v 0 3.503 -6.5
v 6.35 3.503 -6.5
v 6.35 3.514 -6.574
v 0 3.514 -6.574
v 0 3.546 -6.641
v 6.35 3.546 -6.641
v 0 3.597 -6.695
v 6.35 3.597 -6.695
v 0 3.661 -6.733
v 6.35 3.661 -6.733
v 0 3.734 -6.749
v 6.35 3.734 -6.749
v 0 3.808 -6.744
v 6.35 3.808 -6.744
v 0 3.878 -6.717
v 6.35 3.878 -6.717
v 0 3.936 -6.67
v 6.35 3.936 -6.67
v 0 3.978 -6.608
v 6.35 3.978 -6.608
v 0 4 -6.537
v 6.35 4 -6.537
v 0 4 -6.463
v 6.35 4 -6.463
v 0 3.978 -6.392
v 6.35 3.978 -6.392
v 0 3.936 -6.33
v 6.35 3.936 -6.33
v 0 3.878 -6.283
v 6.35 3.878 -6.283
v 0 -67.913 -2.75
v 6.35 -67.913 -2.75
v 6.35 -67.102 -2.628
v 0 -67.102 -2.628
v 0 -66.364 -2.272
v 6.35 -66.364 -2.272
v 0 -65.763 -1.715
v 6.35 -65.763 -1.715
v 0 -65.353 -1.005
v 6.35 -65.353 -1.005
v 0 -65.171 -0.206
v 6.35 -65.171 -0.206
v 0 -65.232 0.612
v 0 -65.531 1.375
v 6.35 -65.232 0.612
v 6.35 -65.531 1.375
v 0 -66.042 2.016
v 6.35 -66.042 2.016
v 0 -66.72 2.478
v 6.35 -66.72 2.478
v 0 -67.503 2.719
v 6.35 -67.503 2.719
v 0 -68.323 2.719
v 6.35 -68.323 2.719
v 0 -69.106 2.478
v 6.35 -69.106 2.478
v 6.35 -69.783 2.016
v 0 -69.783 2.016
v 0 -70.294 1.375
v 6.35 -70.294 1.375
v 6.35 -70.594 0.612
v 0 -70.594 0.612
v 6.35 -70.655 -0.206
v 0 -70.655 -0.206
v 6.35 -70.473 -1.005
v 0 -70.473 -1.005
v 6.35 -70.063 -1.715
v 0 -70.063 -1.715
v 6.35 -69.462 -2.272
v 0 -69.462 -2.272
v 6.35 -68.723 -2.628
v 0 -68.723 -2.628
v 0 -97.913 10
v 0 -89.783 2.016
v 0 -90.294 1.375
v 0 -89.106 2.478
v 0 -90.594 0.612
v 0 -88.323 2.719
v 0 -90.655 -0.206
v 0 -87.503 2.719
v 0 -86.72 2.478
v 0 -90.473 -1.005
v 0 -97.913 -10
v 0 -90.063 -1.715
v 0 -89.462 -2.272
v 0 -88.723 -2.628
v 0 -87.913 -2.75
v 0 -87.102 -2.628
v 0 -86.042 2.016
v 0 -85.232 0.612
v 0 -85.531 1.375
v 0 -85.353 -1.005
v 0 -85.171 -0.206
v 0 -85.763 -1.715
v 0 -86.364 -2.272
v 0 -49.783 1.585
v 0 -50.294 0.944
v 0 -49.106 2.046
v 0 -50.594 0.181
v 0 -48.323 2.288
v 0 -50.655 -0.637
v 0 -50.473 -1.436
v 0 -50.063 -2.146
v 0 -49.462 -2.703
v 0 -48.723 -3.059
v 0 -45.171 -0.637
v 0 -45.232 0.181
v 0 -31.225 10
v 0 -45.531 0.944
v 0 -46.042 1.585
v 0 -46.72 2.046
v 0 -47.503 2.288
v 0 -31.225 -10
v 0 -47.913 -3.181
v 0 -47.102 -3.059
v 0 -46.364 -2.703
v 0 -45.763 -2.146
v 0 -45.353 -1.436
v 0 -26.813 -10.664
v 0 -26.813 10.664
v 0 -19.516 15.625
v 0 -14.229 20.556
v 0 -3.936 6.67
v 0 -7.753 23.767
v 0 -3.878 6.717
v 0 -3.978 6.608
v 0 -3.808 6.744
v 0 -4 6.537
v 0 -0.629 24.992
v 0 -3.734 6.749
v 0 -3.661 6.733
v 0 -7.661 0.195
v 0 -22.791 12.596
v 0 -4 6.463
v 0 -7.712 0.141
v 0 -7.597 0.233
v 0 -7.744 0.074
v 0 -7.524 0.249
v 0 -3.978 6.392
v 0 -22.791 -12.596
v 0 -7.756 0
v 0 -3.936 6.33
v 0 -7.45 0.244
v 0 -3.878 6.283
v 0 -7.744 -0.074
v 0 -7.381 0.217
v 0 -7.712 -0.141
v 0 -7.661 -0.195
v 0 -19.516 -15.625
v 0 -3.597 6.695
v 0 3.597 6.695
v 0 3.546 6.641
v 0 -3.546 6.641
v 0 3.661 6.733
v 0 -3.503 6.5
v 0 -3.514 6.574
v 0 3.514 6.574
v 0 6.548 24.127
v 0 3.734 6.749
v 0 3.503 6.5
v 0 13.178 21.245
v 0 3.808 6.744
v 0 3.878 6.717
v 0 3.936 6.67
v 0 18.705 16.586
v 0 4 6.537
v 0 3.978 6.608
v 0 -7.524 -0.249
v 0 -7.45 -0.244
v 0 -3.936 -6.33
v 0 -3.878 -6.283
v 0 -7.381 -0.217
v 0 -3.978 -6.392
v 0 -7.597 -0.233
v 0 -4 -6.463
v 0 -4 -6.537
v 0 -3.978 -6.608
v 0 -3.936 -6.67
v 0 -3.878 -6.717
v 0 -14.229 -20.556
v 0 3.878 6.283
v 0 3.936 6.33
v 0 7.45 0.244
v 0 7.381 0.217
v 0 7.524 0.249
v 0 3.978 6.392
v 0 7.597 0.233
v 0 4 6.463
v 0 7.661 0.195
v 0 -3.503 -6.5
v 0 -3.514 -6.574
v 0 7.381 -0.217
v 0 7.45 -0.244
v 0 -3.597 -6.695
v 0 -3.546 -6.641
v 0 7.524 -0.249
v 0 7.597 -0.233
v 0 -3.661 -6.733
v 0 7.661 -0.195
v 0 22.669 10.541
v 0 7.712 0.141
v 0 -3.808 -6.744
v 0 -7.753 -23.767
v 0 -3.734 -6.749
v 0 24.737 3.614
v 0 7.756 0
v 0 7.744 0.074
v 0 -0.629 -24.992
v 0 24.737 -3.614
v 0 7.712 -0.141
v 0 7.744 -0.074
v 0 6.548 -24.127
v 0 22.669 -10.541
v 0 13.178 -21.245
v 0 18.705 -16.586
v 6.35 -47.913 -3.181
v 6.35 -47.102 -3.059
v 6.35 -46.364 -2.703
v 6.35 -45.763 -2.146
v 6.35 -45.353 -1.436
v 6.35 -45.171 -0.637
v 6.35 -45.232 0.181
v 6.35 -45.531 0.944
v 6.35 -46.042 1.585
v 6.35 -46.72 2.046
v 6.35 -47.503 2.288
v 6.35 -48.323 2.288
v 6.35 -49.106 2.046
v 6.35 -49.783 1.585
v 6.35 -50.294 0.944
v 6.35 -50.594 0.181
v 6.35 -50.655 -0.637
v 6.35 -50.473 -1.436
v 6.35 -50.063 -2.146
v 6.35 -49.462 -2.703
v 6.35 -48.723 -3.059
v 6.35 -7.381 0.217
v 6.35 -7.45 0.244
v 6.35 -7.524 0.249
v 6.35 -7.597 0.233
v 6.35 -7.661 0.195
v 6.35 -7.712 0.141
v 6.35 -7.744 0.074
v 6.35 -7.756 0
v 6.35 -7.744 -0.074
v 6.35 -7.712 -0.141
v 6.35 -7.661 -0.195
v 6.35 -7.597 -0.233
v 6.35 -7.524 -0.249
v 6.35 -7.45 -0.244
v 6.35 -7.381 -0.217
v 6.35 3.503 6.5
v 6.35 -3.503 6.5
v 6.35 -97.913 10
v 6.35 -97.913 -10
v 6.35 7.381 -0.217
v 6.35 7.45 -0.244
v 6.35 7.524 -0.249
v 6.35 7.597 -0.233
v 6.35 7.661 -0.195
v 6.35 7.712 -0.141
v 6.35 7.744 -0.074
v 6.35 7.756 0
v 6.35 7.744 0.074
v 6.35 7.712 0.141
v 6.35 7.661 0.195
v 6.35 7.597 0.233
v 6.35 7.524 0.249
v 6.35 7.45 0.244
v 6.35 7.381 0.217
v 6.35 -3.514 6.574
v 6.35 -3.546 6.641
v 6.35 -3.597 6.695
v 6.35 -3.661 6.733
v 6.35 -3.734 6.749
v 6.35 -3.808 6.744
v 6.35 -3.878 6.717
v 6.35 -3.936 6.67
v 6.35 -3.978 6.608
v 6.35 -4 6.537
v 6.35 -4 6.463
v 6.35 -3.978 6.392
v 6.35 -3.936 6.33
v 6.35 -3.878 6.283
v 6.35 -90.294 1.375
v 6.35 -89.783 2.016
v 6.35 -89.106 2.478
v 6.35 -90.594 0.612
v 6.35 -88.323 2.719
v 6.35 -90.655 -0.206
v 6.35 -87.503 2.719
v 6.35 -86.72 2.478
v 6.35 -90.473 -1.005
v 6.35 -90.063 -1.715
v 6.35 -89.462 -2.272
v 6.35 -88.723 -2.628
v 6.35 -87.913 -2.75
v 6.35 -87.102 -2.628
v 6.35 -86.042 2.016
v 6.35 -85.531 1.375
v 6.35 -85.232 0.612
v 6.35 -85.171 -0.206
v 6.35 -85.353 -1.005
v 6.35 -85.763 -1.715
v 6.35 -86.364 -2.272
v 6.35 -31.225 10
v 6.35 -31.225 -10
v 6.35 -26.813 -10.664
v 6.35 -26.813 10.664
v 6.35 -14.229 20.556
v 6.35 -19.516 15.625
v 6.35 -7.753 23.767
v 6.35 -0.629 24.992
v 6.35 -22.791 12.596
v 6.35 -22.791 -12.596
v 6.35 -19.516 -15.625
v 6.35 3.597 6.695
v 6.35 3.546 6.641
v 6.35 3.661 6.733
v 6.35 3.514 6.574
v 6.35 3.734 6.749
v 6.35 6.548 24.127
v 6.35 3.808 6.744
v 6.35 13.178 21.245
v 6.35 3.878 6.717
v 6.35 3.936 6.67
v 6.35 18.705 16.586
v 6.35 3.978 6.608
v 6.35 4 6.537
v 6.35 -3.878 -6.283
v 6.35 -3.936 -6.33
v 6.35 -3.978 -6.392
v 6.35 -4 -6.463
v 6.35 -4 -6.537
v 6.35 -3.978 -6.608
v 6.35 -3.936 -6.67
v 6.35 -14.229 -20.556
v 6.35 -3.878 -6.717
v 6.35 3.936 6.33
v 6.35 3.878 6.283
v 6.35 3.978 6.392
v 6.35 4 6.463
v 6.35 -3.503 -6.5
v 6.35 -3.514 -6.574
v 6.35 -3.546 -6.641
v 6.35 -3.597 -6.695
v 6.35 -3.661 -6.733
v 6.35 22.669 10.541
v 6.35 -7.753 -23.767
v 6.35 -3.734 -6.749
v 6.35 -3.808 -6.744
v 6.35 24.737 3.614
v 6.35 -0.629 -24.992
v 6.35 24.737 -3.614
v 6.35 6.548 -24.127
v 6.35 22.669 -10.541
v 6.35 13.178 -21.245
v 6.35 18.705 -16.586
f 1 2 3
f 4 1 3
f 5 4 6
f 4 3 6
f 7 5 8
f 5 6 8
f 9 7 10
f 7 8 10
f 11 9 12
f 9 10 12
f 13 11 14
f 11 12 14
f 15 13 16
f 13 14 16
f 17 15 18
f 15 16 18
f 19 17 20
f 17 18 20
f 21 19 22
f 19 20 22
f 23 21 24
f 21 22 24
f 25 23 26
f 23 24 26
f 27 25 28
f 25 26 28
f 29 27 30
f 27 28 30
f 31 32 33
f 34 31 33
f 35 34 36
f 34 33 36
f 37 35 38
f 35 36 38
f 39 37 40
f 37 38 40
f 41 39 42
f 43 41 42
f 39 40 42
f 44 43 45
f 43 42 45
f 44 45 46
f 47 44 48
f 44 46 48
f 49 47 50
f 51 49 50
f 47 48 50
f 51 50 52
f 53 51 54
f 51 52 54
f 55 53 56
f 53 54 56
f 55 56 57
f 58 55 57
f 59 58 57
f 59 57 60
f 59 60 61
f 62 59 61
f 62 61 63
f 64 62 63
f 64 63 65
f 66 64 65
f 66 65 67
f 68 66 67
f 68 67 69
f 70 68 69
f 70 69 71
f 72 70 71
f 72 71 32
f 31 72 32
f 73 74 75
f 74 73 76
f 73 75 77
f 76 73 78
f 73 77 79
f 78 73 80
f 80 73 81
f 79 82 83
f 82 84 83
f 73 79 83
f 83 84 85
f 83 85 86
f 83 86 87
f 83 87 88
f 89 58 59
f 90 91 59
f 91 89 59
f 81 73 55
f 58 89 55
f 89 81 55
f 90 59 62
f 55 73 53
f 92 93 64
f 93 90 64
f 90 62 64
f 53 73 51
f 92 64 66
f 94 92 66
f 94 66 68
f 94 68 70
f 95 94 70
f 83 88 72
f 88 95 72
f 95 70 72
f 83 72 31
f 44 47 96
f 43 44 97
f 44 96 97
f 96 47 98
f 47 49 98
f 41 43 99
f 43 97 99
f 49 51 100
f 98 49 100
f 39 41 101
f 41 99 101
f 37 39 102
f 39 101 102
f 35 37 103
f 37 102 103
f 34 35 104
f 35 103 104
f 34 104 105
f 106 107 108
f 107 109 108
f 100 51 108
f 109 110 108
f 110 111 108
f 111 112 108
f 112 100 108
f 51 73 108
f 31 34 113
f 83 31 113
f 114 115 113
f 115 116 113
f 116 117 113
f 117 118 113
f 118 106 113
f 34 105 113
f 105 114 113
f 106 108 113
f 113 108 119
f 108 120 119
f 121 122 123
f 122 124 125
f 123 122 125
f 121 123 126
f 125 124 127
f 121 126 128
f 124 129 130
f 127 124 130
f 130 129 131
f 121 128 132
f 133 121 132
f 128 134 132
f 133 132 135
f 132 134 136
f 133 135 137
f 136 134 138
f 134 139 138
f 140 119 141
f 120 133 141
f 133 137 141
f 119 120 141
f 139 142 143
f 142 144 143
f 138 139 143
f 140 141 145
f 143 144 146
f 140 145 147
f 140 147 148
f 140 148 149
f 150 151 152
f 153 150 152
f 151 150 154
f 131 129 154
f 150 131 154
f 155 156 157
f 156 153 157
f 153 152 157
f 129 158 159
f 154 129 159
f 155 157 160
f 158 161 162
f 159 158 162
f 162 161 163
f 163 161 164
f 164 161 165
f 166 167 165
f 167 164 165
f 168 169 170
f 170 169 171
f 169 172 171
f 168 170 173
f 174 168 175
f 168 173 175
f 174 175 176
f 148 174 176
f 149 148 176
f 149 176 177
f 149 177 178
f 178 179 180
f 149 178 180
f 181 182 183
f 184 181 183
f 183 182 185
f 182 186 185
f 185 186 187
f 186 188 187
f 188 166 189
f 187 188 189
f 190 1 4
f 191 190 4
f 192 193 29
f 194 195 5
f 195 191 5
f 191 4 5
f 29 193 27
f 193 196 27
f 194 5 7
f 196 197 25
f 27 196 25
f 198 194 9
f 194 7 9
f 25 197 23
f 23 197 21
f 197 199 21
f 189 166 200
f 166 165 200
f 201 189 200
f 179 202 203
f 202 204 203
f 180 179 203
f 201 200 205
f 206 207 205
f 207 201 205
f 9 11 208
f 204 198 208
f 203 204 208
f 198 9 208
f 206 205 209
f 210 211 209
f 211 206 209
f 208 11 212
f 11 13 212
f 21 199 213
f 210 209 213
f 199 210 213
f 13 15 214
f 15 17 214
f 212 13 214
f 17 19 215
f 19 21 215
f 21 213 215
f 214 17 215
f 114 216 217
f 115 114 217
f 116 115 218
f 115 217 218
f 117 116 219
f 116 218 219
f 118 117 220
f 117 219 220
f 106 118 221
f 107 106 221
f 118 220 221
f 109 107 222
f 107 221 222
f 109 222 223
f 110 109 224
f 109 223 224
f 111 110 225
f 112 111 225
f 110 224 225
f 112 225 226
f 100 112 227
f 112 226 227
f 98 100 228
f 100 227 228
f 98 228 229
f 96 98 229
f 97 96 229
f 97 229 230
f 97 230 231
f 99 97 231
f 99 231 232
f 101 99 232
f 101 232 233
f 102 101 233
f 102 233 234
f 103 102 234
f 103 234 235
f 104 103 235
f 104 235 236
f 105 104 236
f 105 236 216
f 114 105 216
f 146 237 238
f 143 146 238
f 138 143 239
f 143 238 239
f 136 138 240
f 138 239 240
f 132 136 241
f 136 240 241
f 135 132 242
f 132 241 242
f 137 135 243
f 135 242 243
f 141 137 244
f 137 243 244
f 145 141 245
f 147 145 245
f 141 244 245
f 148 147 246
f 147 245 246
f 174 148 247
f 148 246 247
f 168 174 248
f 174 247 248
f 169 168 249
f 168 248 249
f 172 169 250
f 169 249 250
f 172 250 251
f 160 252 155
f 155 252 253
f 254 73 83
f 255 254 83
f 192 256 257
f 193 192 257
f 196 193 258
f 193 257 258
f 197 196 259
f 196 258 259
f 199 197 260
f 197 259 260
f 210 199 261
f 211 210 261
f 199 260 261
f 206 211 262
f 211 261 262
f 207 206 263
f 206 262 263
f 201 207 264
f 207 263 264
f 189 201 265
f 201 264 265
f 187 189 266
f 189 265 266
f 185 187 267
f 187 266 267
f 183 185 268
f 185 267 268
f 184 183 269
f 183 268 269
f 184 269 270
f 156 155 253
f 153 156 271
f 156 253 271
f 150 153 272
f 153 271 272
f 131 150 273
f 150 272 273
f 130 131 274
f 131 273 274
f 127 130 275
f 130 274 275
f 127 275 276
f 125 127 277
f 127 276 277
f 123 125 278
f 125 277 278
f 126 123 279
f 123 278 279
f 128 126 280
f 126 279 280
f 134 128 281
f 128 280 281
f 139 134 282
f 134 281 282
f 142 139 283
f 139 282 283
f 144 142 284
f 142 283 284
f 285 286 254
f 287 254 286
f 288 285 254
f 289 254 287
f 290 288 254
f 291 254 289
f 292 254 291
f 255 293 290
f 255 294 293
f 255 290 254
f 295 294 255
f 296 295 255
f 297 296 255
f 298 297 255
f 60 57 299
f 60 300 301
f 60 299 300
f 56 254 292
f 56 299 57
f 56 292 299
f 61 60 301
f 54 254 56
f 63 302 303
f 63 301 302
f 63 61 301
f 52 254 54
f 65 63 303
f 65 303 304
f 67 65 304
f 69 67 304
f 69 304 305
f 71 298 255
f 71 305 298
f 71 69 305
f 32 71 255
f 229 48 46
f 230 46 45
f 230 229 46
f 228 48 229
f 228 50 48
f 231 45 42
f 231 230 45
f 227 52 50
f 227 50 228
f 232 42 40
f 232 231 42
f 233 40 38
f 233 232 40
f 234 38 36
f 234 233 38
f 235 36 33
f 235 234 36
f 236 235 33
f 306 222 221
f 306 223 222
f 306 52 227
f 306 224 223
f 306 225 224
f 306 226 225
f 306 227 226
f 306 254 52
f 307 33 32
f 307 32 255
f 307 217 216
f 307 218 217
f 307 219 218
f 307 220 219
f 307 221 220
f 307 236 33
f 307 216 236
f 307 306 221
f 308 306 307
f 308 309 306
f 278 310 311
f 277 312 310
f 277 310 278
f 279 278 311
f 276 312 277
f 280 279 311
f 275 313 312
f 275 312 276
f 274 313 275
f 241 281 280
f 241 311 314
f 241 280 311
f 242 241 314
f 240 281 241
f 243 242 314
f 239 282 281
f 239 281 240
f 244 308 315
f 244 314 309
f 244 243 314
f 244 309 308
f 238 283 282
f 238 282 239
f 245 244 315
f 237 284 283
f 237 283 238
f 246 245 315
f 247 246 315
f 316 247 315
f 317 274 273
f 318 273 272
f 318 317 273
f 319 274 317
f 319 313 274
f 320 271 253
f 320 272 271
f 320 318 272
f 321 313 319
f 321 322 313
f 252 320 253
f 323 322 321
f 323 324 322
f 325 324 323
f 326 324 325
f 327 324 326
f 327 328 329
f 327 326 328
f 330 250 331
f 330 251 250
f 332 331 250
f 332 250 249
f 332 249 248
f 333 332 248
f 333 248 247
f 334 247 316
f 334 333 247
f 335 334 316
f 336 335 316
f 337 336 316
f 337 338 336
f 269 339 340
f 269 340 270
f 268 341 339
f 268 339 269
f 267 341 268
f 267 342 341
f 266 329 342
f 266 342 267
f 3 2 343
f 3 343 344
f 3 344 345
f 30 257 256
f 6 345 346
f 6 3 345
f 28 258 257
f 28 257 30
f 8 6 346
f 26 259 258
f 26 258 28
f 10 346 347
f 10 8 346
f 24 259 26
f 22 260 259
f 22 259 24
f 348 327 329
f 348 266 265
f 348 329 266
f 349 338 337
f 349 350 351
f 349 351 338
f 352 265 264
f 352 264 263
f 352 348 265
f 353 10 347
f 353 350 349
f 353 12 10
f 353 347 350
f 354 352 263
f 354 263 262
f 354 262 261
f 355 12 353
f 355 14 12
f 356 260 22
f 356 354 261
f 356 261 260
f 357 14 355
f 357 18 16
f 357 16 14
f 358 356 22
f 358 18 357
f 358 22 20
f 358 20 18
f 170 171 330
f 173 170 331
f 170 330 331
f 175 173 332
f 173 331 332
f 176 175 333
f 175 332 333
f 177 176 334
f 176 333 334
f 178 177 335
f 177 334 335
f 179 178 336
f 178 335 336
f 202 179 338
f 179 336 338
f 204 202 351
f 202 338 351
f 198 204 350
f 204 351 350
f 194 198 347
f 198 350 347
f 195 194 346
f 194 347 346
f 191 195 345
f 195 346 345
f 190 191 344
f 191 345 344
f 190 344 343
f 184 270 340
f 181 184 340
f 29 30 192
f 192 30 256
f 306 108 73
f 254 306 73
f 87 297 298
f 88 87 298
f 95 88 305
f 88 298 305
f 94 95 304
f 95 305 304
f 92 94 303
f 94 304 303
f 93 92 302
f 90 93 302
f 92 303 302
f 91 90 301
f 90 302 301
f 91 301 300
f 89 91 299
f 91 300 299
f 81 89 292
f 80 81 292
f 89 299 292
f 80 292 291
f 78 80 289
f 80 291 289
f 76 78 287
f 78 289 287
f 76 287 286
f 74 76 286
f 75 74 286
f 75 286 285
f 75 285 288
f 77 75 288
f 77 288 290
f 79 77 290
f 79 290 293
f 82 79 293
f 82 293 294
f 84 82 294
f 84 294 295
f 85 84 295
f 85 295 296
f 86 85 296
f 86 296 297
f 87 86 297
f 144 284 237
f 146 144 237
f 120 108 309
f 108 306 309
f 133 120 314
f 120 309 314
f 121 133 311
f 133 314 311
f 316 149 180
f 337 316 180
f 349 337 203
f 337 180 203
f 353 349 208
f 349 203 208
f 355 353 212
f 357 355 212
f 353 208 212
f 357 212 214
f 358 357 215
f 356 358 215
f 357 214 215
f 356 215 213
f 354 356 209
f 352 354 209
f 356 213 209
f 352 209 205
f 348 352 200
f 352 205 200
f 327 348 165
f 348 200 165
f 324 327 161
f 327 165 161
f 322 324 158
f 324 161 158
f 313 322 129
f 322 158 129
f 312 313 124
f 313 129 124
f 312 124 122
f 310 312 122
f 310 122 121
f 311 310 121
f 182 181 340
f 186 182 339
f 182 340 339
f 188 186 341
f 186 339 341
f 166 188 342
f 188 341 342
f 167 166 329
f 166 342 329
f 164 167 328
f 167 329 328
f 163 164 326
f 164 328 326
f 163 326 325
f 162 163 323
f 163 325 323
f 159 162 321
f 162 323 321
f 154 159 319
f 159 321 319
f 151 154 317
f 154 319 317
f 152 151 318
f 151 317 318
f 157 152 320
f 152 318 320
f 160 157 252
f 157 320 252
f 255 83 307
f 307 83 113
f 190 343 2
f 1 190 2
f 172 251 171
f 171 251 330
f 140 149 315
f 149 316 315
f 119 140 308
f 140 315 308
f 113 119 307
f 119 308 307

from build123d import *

# Parameters (mm, degrees)
BOSS_EXTRUDE1_DEPTH = 6.35
SKETCH2_R           = 2.75
CUT_EXTRUDE1_DEPTH  = 7.35
FILLET1_R           = 15
CUT_EXTRUDE2_REACH  = 8.35
CUT_EXTRUDE3_REACH  = 8.35
SKETCH4_R           = 0.25


with BuildPart() as part:
    # Sketch1 → Boss-Extrude1 (new body)
    with BuildSketch(Plane(origin=(0, 0, 0), x_dir=(0, 0, -1), z_dir=(1, 0, 0))):
        with BuildLine():
            Line((-10, -22.912878475), (-10, -97.912878475))
            Line((-10, -97.912878475), (10, -97.912878475))
            Line((10, -97.912878475), (10, -22.912878475))
            ThreePointArc((10, -22.912878475), (0, 25), (-10, -22.912878475))
        make_face()
    extrude(amount=BOSS_EXTRUDE1_DEPTH)

    # Sketch2 → Cut-Extrude1 (cut, through all)
    with BuildSketch(Plane(origin=(6.35, 0, 0), x_dir=(0, 0, -1), z_dir=(1, 0, 0))):
        with Locations((0, -87.912878475)):
            Circle(SKETCH2_R)
        with Locations((0, -67.912878475)):
            Circle(SKETCH2_R)
        with Locations((0.431184648, -47.912878475)):
            Circle(SKETCH2_R)
    extrude(amount=-CUT_EXTRUDE1_DEPTH, mode=Mode.SUBTRACT)

    # Fillet1
    fillet1_edges = [part.edges().sort_by_distance(p)[0] for p in [
        (3.175, -22.912878475, 10),
        (3.175, -22.912878475, -10),
    ]]
    fillet(fillet1_edges, radius=FILLET1_R)

    # Sketch3 → Cut-Extrude2 (cut, up to next)
    with BuildSketch(Plane(origin=(6.35, 0, 0), x_dir=(0, 0, -1), z_dir=(1, 0, 0)), mode=Mode.PRIVATE) as cut_extrude2_sk1:
        Polygon((0, -7.505553499), (6.5, -3.75277675), (6.5, 3.75277675), (0, 7.505553499), (-6.5, 3.75277675), (-6.5, -3.75277675), align=None)
    cut_extrude2_tool1 = extrude(cut_extrude2_sk1.sketch, amount=-CUT_EXTRUDE2_REACH, mode=Mode.PRIVATE) & part.part
    add(cut_extrude2_tool1.solids().sort_by_distance((6.35, 0, 0))[0], mode=Mode.SUBTRACT)

    # Sketch4 → Cut-Extrude3 (cut, up to next)
    with BuildSketch(Plane(origin=(6.35, 0, 0), x_dir=(0, 0, -1), z_dir=(1, 0, 0)), mode=Mode.PRIVATE) as cut_extrude3_sk1:
        with Locations((0, 7.505553499)):
            Circle(SKETCH4_R)
    cut_extrude3_tool1 = extrude(cut_extrude3_sk1.sketch, amount=-CUT_EXTRUDE3_REACH, mode=Mode.PRIVATE) & part.part
    add(cut_extrude3_tool1.solids().sort_by_distance((6.35, 7.505553, 0))[0], mode=Mode.SUBTRACT)
    # Sketch4 → Cut-Extrude3 (cut, up to next)
    with BuildSketch(Plane(origin=(6.35, 0, 0), x_dir=(0, 0, -1), z_dir=(1, 0, 0)), mode=Mode.PRIVATE) as cut_extrude3_sk2:
        with Locations((6.5, 3.75277675)):
            Circle(SKETCH4_R)
    cut_extrude3_tool2 = extrude(cut_extrude3_sk2.sketch, amount=-CUT_EXTRUDE3_REACH, mode=Mode.PRIVATE) & part.part
    add(cut_extrude3_tool2.solids().sort_by_distance((6.35, 3.752777, -6.5))[0], mode=Mode.SUBTRACT)
    # Sketch4 → Cut-Extrude3 (cut, up to next)
    with BuildSketch(Plane(origin=(6.35, 0, 0), x_dir=(0, 0, -1), z_dir=(1, 0, 0)), mode=Mode.PRIVATE) as cut_extrude3_sk3:
        with Locations((6.5, -3.75277675)):
            Circle(SKETCH4_R)
    cut_extrude3_tool3 = extrude(cut_extrude3_sk3.sketch, amount=-CUT_EXTRUDE3_REACH, mode=Mode.PRIVATE) & part.part
    add(cut_extrude3_tool3.solids().sort_by_distance((6.35, -3.752777, -6.5))[0], mode=Mode.SUBTRACT)
    # Sketch4 → Cut-Extrude3 (cut, up to next)
    with BuildSketch(Plane(origin=(6.35, 0, 0), x_dir=(0, 0, -1), z_dir=(1, 0, 0)), mode=Mode.PRIVATE) as cut_extrude3_sk4:
        with Locations((0, -7.505553499)):
            Circle(SKETCH4_R)
    cut_extrude3_tool4 = extrude(cut_extrude3_sk4.sketch, amount=-CUT_EXTRUDE3_REACH, mode=Mode.PRIVATE) & part.part
    add(cut_extrude3_tool4.solids().sort_by_distance((6.35, -7.505553, 0))[0], mode=Mode.SUBTRACT)
    # Sketch4 → Cut-Extrude3 (cut, up to next)
    with BuildSketch(Plane(origin=(6.35, 0, 0), x_dir=(0, 0, -1), z_dir=(1, 0, 0)), mode=Mode.PRIVATE) as cut_extrude3_sk5:
        with Locations((-6.5, -3.75277675)):
            Circle(SKETCH4_R)
    cut_extrude3_tool5 = extrude(cut_extrude3_sk5.sketch, amount=-CUT_EXTRUDE3_REACH, mode=Mode.PRIVATE) & part.part
    add(cut_extrude3_tool5.solids().sort_by_distance((6.35, -3.752777, 6.5))[0], mode=Mode.SUBTRACT)
    # Sketch4 → Cut-Extrude3 (cut, up to next)
    with BuildSketch(Plane(origin=(6.35, 0, 0), x_dir=(0, 0, -1), z_dir=(1, 0, 0)), mode=Mode.PRIVATE) as cut_extrude3_sk6:
        with Locations((-6.5, 3.75277675)):
            Circle(SKETCH4_R)
    cut_extrude3_tool6 = extrude(cut_extrude3_sk6.sketch, amount=-CUT_EXTRUDE3_REACH, mode=Mode.PRIVATE) & part.part
    add(cut_extrude3_tool6.solids().sort_by_distance((6.35, 3.752777, 6.5))[0], mode=Mode.SUBTRACT)


solid = part.part
